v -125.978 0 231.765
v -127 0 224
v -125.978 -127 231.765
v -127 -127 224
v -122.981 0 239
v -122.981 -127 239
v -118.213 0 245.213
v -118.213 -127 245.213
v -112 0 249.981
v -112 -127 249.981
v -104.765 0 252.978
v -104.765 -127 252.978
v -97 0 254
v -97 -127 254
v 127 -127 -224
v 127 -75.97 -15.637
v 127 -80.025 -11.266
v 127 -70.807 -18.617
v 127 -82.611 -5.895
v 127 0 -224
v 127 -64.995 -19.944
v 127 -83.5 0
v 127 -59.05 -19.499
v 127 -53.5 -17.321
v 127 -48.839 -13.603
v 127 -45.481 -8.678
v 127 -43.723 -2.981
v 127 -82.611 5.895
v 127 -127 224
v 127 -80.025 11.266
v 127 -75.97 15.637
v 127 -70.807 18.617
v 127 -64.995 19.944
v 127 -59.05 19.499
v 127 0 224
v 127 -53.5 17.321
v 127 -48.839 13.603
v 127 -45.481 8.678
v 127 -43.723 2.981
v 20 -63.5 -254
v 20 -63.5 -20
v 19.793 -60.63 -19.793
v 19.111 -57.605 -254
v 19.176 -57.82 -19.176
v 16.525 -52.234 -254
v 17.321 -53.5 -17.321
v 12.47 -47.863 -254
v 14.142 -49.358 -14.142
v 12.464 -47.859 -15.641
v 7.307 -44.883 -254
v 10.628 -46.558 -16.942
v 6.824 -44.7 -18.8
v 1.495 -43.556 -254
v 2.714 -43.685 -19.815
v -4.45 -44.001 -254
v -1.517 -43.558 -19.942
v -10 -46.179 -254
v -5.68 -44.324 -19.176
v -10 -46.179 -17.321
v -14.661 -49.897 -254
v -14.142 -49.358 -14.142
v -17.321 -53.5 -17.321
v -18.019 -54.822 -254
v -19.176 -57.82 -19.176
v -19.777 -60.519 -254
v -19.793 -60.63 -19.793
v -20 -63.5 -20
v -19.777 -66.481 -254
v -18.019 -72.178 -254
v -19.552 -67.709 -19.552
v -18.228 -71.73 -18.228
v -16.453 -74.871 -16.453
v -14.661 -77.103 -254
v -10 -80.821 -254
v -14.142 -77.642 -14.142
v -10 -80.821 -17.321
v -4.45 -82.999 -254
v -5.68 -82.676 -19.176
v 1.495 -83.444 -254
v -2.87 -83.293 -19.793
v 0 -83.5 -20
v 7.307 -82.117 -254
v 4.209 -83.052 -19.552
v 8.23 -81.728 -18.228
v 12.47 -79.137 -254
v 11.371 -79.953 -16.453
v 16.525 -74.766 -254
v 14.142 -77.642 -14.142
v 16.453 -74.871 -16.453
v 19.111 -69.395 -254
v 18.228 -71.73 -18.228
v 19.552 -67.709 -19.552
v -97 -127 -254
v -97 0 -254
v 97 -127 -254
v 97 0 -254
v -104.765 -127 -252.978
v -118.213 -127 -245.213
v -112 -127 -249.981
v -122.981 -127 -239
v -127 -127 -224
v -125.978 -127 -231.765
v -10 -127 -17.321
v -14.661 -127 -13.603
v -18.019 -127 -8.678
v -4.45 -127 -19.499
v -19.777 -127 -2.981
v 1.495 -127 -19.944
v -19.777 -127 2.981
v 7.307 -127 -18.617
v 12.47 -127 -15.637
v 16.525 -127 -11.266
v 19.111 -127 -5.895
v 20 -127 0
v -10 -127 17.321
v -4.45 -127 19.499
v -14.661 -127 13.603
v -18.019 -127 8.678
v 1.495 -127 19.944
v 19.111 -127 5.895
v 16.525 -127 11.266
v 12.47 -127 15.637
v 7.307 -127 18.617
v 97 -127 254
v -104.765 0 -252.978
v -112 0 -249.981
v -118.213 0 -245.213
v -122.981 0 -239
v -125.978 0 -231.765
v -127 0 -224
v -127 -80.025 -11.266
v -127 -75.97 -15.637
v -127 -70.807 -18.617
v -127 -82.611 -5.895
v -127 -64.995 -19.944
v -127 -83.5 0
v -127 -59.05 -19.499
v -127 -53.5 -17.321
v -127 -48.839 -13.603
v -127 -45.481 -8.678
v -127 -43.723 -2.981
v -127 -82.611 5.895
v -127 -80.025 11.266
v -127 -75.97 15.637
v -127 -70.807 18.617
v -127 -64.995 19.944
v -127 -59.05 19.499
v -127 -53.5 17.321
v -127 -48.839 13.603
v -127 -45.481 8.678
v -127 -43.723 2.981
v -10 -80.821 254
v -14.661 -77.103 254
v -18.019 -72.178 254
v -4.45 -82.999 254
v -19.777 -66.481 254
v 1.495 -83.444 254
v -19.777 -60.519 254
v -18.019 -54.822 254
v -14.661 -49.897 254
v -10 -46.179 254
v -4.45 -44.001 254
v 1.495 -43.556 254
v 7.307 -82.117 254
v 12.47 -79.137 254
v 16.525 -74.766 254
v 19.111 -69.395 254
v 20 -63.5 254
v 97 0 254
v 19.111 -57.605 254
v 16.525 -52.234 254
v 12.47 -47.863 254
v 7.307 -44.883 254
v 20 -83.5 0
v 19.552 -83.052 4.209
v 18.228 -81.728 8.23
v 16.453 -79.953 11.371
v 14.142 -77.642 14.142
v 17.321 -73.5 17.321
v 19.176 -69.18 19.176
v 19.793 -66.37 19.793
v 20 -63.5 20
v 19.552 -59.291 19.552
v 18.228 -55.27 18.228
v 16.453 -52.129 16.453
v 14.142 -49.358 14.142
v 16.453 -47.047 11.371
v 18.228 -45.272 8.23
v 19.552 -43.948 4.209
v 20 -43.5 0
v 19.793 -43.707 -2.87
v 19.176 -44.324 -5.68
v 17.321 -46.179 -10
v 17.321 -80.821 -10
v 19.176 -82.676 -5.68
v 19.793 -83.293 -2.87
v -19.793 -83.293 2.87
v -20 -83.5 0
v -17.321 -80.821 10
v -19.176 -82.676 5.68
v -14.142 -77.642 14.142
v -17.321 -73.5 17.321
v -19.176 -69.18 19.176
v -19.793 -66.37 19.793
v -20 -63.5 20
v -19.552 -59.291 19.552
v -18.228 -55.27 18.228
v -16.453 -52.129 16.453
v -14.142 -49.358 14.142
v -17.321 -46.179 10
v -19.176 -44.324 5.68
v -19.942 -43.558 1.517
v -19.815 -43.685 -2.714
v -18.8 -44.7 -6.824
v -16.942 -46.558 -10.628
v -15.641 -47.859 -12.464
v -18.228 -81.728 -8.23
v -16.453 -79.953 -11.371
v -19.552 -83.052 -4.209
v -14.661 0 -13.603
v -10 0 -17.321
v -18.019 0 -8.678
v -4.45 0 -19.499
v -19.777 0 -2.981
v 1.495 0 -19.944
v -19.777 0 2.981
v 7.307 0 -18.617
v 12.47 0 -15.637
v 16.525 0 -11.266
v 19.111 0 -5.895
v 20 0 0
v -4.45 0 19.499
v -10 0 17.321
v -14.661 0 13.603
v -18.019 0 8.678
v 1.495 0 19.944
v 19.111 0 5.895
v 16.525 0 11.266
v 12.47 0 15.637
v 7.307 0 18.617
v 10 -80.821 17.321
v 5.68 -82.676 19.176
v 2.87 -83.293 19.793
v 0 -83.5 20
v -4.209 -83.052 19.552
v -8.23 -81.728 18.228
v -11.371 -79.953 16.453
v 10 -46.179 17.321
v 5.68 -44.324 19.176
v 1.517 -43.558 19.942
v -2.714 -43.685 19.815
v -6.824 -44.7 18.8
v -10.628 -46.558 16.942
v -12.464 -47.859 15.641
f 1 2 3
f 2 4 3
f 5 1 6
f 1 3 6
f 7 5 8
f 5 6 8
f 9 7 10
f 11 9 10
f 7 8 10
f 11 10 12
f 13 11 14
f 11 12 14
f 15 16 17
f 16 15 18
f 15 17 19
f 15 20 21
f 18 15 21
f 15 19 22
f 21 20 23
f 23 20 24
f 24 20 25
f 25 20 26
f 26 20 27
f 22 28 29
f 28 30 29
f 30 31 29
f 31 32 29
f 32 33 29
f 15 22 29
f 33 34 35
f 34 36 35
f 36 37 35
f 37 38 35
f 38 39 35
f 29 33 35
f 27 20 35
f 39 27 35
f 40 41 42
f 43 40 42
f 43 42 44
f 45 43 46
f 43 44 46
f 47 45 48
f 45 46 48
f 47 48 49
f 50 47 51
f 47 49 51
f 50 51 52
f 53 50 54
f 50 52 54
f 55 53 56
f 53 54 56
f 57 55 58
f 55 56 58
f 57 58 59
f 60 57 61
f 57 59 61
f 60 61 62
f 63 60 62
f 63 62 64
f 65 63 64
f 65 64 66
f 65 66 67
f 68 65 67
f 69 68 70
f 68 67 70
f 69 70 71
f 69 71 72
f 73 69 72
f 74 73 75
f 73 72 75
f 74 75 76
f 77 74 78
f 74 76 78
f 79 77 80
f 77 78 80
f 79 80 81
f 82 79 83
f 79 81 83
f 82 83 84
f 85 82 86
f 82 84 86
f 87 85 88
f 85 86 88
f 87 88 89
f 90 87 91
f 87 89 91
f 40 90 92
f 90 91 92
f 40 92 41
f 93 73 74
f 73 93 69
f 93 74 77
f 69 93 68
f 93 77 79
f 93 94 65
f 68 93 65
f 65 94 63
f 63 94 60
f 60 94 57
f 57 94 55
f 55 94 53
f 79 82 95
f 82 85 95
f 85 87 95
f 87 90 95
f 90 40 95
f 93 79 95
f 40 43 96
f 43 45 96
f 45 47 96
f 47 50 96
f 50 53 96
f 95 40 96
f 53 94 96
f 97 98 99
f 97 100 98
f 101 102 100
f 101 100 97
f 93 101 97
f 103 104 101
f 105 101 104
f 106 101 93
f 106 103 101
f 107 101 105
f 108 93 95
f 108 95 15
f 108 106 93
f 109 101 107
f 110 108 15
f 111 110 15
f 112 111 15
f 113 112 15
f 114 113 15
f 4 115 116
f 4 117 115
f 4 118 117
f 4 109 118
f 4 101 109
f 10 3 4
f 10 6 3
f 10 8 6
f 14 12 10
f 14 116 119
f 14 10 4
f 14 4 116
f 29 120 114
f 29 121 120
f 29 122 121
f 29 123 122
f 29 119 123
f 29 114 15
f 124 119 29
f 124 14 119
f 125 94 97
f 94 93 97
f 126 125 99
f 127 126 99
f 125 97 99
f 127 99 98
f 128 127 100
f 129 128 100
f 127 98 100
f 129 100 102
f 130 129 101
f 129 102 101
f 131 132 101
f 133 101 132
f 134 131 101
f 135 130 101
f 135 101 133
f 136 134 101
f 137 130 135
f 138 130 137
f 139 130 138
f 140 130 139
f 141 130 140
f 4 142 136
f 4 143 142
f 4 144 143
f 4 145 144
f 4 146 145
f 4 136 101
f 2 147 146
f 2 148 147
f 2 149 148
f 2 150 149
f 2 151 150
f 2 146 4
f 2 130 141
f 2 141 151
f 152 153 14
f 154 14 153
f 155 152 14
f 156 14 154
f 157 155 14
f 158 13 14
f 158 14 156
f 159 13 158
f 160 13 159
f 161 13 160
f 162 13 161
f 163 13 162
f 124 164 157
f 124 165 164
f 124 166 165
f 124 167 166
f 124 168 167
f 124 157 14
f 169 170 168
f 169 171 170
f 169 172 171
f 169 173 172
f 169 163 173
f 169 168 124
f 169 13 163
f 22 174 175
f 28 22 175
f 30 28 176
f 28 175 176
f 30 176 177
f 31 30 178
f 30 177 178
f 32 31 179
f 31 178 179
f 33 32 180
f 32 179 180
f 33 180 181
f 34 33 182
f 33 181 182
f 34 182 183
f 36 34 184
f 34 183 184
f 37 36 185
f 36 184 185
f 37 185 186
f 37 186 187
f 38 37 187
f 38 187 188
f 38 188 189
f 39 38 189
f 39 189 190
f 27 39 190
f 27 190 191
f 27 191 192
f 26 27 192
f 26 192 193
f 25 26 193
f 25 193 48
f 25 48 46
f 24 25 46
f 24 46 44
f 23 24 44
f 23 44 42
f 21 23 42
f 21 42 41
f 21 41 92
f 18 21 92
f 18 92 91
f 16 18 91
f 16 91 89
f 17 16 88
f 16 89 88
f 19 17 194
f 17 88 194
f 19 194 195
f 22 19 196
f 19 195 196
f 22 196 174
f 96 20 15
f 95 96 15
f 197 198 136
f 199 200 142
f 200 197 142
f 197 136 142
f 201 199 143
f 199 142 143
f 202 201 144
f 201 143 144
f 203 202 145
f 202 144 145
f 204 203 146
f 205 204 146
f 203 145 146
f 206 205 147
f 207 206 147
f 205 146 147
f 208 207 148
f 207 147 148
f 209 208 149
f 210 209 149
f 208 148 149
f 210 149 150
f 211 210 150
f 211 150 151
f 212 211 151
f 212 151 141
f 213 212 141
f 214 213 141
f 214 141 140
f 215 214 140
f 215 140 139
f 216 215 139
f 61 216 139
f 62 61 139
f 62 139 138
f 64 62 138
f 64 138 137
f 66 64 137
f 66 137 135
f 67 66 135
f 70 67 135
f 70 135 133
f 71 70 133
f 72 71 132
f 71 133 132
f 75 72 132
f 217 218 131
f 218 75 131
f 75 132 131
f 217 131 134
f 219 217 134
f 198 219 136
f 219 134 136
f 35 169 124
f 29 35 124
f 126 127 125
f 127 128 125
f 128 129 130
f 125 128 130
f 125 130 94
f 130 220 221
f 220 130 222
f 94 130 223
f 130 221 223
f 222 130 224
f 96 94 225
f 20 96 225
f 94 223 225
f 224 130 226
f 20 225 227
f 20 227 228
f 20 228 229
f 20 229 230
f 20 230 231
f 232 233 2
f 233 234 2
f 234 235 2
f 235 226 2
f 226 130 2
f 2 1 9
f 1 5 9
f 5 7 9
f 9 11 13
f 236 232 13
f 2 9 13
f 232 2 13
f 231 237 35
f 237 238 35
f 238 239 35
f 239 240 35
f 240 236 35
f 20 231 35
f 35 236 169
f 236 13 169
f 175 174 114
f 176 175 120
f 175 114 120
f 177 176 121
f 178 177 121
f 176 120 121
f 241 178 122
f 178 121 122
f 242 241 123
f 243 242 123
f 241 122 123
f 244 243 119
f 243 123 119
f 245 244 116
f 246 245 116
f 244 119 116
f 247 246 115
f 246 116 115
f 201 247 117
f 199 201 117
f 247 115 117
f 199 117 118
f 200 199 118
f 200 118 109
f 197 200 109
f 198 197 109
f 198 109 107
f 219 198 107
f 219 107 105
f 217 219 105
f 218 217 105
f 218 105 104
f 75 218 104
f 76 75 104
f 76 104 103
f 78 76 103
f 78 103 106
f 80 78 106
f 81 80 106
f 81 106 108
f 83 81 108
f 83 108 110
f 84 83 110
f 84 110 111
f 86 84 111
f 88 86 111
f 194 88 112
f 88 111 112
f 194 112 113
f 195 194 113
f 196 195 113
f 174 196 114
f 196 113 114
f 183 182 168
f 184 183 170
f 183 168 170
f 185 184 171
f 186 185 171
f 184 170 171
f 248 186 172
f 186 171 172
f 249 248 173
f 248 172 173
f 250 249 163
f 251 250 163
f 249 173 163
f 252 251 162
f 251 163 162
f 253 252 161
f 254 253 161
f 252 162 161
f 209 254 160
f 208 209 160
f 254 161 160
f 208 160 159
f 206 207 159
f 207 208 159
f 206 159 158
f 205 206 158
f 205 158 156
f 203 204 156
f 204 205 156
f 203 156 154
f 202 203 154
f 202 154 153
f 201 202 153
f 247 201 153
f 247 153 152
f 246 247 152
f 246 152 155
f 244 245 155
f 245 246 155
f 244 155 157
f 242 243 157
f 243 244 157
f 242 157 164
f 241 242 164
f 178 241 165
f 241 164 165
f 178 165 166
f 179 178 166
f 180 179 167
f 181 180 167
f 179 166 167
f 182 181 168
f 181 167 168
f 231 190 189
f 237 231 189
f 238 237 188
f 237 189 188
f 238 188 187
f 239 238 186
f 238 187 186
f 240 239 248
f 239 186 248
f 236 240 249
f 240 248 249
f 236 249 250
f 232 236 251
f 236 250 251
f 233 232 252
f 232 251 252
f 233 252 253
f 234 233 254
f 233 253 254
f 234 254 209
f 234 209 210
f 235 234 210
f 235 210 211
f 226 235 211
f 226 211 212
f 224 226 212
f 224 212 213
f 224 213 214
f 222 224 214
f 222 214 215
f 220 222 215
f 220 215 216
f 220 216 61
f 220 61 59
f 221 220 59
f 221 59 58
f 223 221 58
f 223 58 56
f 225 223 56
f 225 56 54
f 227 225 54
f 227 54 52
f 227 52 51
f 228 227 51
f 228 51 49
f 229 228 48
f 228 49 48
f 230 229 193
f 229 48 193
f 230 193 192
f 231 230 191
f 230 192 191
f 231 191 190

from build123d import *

# Parameters (mm, degrees)
F0_W     = 254
F0_H     = 508
F1_DEPTH = 127
F3_SIZE  = 30
F4_R     = 30
F2_R     = 20
F5_DEPTH = 127.001
F6_R     = 20
F7_DEPTH = 254.001
F8_R     = 20
F9_DEPTH = 508.001


with BuildPart() as f1:
    # F0 (on Front) → F1 (new body)
    with BuildSketch(Plane.XZ):
        Rectangle(F0_W, F0_H)
    extrude(amount=F1_DEPTH)

    # F3
    f3_edges = [f1.edges().sort_by_distance(p)[0] for p in [
        (127, -63.5, 254),
        (127, -63.5, -254),
    ]]
    chamfer(f3_edges, length=F3_SIZE)

    # F4
    f4_edges = [f1.edges().sort_by_distance(p)[0] for p in [
        (-127, -63.5, 254),
        (-127, -63.5, -254),
    ]]
    fillet(f4_edges, radius=F4_R)

    # F2 (on face) → F5 (cut, through all)
    with BuildSketch(Plane.XZ.offset(127)):
        Circle(F2_R)
    extrude(amount=-F5_DEPTH, mode=Mode.SUBTRACT)

    # F6 (on face) → F7 (cut, through all)
    with BuildSketch(Plane(origin=(-127, 0, 0), x_dir=(0, -1, 0), z_dir=(-1, 0, 0))):
        with Locations((63.5, 0)):
            Circle(F6_R)
    extrude(amount=-F7_DEPTH, mode=Mode.SUBTRACT)

    # F8 (on face) → F9 (cut, through all)
    with BuildSketch(Plane.XY.offset(254)):
        with Locations((0, -63.5)):
            Circle(F8_R)
    extrude(amount=-F9_DEPTH, mode=Mode.SUBTRACT)


solid = f1.part
